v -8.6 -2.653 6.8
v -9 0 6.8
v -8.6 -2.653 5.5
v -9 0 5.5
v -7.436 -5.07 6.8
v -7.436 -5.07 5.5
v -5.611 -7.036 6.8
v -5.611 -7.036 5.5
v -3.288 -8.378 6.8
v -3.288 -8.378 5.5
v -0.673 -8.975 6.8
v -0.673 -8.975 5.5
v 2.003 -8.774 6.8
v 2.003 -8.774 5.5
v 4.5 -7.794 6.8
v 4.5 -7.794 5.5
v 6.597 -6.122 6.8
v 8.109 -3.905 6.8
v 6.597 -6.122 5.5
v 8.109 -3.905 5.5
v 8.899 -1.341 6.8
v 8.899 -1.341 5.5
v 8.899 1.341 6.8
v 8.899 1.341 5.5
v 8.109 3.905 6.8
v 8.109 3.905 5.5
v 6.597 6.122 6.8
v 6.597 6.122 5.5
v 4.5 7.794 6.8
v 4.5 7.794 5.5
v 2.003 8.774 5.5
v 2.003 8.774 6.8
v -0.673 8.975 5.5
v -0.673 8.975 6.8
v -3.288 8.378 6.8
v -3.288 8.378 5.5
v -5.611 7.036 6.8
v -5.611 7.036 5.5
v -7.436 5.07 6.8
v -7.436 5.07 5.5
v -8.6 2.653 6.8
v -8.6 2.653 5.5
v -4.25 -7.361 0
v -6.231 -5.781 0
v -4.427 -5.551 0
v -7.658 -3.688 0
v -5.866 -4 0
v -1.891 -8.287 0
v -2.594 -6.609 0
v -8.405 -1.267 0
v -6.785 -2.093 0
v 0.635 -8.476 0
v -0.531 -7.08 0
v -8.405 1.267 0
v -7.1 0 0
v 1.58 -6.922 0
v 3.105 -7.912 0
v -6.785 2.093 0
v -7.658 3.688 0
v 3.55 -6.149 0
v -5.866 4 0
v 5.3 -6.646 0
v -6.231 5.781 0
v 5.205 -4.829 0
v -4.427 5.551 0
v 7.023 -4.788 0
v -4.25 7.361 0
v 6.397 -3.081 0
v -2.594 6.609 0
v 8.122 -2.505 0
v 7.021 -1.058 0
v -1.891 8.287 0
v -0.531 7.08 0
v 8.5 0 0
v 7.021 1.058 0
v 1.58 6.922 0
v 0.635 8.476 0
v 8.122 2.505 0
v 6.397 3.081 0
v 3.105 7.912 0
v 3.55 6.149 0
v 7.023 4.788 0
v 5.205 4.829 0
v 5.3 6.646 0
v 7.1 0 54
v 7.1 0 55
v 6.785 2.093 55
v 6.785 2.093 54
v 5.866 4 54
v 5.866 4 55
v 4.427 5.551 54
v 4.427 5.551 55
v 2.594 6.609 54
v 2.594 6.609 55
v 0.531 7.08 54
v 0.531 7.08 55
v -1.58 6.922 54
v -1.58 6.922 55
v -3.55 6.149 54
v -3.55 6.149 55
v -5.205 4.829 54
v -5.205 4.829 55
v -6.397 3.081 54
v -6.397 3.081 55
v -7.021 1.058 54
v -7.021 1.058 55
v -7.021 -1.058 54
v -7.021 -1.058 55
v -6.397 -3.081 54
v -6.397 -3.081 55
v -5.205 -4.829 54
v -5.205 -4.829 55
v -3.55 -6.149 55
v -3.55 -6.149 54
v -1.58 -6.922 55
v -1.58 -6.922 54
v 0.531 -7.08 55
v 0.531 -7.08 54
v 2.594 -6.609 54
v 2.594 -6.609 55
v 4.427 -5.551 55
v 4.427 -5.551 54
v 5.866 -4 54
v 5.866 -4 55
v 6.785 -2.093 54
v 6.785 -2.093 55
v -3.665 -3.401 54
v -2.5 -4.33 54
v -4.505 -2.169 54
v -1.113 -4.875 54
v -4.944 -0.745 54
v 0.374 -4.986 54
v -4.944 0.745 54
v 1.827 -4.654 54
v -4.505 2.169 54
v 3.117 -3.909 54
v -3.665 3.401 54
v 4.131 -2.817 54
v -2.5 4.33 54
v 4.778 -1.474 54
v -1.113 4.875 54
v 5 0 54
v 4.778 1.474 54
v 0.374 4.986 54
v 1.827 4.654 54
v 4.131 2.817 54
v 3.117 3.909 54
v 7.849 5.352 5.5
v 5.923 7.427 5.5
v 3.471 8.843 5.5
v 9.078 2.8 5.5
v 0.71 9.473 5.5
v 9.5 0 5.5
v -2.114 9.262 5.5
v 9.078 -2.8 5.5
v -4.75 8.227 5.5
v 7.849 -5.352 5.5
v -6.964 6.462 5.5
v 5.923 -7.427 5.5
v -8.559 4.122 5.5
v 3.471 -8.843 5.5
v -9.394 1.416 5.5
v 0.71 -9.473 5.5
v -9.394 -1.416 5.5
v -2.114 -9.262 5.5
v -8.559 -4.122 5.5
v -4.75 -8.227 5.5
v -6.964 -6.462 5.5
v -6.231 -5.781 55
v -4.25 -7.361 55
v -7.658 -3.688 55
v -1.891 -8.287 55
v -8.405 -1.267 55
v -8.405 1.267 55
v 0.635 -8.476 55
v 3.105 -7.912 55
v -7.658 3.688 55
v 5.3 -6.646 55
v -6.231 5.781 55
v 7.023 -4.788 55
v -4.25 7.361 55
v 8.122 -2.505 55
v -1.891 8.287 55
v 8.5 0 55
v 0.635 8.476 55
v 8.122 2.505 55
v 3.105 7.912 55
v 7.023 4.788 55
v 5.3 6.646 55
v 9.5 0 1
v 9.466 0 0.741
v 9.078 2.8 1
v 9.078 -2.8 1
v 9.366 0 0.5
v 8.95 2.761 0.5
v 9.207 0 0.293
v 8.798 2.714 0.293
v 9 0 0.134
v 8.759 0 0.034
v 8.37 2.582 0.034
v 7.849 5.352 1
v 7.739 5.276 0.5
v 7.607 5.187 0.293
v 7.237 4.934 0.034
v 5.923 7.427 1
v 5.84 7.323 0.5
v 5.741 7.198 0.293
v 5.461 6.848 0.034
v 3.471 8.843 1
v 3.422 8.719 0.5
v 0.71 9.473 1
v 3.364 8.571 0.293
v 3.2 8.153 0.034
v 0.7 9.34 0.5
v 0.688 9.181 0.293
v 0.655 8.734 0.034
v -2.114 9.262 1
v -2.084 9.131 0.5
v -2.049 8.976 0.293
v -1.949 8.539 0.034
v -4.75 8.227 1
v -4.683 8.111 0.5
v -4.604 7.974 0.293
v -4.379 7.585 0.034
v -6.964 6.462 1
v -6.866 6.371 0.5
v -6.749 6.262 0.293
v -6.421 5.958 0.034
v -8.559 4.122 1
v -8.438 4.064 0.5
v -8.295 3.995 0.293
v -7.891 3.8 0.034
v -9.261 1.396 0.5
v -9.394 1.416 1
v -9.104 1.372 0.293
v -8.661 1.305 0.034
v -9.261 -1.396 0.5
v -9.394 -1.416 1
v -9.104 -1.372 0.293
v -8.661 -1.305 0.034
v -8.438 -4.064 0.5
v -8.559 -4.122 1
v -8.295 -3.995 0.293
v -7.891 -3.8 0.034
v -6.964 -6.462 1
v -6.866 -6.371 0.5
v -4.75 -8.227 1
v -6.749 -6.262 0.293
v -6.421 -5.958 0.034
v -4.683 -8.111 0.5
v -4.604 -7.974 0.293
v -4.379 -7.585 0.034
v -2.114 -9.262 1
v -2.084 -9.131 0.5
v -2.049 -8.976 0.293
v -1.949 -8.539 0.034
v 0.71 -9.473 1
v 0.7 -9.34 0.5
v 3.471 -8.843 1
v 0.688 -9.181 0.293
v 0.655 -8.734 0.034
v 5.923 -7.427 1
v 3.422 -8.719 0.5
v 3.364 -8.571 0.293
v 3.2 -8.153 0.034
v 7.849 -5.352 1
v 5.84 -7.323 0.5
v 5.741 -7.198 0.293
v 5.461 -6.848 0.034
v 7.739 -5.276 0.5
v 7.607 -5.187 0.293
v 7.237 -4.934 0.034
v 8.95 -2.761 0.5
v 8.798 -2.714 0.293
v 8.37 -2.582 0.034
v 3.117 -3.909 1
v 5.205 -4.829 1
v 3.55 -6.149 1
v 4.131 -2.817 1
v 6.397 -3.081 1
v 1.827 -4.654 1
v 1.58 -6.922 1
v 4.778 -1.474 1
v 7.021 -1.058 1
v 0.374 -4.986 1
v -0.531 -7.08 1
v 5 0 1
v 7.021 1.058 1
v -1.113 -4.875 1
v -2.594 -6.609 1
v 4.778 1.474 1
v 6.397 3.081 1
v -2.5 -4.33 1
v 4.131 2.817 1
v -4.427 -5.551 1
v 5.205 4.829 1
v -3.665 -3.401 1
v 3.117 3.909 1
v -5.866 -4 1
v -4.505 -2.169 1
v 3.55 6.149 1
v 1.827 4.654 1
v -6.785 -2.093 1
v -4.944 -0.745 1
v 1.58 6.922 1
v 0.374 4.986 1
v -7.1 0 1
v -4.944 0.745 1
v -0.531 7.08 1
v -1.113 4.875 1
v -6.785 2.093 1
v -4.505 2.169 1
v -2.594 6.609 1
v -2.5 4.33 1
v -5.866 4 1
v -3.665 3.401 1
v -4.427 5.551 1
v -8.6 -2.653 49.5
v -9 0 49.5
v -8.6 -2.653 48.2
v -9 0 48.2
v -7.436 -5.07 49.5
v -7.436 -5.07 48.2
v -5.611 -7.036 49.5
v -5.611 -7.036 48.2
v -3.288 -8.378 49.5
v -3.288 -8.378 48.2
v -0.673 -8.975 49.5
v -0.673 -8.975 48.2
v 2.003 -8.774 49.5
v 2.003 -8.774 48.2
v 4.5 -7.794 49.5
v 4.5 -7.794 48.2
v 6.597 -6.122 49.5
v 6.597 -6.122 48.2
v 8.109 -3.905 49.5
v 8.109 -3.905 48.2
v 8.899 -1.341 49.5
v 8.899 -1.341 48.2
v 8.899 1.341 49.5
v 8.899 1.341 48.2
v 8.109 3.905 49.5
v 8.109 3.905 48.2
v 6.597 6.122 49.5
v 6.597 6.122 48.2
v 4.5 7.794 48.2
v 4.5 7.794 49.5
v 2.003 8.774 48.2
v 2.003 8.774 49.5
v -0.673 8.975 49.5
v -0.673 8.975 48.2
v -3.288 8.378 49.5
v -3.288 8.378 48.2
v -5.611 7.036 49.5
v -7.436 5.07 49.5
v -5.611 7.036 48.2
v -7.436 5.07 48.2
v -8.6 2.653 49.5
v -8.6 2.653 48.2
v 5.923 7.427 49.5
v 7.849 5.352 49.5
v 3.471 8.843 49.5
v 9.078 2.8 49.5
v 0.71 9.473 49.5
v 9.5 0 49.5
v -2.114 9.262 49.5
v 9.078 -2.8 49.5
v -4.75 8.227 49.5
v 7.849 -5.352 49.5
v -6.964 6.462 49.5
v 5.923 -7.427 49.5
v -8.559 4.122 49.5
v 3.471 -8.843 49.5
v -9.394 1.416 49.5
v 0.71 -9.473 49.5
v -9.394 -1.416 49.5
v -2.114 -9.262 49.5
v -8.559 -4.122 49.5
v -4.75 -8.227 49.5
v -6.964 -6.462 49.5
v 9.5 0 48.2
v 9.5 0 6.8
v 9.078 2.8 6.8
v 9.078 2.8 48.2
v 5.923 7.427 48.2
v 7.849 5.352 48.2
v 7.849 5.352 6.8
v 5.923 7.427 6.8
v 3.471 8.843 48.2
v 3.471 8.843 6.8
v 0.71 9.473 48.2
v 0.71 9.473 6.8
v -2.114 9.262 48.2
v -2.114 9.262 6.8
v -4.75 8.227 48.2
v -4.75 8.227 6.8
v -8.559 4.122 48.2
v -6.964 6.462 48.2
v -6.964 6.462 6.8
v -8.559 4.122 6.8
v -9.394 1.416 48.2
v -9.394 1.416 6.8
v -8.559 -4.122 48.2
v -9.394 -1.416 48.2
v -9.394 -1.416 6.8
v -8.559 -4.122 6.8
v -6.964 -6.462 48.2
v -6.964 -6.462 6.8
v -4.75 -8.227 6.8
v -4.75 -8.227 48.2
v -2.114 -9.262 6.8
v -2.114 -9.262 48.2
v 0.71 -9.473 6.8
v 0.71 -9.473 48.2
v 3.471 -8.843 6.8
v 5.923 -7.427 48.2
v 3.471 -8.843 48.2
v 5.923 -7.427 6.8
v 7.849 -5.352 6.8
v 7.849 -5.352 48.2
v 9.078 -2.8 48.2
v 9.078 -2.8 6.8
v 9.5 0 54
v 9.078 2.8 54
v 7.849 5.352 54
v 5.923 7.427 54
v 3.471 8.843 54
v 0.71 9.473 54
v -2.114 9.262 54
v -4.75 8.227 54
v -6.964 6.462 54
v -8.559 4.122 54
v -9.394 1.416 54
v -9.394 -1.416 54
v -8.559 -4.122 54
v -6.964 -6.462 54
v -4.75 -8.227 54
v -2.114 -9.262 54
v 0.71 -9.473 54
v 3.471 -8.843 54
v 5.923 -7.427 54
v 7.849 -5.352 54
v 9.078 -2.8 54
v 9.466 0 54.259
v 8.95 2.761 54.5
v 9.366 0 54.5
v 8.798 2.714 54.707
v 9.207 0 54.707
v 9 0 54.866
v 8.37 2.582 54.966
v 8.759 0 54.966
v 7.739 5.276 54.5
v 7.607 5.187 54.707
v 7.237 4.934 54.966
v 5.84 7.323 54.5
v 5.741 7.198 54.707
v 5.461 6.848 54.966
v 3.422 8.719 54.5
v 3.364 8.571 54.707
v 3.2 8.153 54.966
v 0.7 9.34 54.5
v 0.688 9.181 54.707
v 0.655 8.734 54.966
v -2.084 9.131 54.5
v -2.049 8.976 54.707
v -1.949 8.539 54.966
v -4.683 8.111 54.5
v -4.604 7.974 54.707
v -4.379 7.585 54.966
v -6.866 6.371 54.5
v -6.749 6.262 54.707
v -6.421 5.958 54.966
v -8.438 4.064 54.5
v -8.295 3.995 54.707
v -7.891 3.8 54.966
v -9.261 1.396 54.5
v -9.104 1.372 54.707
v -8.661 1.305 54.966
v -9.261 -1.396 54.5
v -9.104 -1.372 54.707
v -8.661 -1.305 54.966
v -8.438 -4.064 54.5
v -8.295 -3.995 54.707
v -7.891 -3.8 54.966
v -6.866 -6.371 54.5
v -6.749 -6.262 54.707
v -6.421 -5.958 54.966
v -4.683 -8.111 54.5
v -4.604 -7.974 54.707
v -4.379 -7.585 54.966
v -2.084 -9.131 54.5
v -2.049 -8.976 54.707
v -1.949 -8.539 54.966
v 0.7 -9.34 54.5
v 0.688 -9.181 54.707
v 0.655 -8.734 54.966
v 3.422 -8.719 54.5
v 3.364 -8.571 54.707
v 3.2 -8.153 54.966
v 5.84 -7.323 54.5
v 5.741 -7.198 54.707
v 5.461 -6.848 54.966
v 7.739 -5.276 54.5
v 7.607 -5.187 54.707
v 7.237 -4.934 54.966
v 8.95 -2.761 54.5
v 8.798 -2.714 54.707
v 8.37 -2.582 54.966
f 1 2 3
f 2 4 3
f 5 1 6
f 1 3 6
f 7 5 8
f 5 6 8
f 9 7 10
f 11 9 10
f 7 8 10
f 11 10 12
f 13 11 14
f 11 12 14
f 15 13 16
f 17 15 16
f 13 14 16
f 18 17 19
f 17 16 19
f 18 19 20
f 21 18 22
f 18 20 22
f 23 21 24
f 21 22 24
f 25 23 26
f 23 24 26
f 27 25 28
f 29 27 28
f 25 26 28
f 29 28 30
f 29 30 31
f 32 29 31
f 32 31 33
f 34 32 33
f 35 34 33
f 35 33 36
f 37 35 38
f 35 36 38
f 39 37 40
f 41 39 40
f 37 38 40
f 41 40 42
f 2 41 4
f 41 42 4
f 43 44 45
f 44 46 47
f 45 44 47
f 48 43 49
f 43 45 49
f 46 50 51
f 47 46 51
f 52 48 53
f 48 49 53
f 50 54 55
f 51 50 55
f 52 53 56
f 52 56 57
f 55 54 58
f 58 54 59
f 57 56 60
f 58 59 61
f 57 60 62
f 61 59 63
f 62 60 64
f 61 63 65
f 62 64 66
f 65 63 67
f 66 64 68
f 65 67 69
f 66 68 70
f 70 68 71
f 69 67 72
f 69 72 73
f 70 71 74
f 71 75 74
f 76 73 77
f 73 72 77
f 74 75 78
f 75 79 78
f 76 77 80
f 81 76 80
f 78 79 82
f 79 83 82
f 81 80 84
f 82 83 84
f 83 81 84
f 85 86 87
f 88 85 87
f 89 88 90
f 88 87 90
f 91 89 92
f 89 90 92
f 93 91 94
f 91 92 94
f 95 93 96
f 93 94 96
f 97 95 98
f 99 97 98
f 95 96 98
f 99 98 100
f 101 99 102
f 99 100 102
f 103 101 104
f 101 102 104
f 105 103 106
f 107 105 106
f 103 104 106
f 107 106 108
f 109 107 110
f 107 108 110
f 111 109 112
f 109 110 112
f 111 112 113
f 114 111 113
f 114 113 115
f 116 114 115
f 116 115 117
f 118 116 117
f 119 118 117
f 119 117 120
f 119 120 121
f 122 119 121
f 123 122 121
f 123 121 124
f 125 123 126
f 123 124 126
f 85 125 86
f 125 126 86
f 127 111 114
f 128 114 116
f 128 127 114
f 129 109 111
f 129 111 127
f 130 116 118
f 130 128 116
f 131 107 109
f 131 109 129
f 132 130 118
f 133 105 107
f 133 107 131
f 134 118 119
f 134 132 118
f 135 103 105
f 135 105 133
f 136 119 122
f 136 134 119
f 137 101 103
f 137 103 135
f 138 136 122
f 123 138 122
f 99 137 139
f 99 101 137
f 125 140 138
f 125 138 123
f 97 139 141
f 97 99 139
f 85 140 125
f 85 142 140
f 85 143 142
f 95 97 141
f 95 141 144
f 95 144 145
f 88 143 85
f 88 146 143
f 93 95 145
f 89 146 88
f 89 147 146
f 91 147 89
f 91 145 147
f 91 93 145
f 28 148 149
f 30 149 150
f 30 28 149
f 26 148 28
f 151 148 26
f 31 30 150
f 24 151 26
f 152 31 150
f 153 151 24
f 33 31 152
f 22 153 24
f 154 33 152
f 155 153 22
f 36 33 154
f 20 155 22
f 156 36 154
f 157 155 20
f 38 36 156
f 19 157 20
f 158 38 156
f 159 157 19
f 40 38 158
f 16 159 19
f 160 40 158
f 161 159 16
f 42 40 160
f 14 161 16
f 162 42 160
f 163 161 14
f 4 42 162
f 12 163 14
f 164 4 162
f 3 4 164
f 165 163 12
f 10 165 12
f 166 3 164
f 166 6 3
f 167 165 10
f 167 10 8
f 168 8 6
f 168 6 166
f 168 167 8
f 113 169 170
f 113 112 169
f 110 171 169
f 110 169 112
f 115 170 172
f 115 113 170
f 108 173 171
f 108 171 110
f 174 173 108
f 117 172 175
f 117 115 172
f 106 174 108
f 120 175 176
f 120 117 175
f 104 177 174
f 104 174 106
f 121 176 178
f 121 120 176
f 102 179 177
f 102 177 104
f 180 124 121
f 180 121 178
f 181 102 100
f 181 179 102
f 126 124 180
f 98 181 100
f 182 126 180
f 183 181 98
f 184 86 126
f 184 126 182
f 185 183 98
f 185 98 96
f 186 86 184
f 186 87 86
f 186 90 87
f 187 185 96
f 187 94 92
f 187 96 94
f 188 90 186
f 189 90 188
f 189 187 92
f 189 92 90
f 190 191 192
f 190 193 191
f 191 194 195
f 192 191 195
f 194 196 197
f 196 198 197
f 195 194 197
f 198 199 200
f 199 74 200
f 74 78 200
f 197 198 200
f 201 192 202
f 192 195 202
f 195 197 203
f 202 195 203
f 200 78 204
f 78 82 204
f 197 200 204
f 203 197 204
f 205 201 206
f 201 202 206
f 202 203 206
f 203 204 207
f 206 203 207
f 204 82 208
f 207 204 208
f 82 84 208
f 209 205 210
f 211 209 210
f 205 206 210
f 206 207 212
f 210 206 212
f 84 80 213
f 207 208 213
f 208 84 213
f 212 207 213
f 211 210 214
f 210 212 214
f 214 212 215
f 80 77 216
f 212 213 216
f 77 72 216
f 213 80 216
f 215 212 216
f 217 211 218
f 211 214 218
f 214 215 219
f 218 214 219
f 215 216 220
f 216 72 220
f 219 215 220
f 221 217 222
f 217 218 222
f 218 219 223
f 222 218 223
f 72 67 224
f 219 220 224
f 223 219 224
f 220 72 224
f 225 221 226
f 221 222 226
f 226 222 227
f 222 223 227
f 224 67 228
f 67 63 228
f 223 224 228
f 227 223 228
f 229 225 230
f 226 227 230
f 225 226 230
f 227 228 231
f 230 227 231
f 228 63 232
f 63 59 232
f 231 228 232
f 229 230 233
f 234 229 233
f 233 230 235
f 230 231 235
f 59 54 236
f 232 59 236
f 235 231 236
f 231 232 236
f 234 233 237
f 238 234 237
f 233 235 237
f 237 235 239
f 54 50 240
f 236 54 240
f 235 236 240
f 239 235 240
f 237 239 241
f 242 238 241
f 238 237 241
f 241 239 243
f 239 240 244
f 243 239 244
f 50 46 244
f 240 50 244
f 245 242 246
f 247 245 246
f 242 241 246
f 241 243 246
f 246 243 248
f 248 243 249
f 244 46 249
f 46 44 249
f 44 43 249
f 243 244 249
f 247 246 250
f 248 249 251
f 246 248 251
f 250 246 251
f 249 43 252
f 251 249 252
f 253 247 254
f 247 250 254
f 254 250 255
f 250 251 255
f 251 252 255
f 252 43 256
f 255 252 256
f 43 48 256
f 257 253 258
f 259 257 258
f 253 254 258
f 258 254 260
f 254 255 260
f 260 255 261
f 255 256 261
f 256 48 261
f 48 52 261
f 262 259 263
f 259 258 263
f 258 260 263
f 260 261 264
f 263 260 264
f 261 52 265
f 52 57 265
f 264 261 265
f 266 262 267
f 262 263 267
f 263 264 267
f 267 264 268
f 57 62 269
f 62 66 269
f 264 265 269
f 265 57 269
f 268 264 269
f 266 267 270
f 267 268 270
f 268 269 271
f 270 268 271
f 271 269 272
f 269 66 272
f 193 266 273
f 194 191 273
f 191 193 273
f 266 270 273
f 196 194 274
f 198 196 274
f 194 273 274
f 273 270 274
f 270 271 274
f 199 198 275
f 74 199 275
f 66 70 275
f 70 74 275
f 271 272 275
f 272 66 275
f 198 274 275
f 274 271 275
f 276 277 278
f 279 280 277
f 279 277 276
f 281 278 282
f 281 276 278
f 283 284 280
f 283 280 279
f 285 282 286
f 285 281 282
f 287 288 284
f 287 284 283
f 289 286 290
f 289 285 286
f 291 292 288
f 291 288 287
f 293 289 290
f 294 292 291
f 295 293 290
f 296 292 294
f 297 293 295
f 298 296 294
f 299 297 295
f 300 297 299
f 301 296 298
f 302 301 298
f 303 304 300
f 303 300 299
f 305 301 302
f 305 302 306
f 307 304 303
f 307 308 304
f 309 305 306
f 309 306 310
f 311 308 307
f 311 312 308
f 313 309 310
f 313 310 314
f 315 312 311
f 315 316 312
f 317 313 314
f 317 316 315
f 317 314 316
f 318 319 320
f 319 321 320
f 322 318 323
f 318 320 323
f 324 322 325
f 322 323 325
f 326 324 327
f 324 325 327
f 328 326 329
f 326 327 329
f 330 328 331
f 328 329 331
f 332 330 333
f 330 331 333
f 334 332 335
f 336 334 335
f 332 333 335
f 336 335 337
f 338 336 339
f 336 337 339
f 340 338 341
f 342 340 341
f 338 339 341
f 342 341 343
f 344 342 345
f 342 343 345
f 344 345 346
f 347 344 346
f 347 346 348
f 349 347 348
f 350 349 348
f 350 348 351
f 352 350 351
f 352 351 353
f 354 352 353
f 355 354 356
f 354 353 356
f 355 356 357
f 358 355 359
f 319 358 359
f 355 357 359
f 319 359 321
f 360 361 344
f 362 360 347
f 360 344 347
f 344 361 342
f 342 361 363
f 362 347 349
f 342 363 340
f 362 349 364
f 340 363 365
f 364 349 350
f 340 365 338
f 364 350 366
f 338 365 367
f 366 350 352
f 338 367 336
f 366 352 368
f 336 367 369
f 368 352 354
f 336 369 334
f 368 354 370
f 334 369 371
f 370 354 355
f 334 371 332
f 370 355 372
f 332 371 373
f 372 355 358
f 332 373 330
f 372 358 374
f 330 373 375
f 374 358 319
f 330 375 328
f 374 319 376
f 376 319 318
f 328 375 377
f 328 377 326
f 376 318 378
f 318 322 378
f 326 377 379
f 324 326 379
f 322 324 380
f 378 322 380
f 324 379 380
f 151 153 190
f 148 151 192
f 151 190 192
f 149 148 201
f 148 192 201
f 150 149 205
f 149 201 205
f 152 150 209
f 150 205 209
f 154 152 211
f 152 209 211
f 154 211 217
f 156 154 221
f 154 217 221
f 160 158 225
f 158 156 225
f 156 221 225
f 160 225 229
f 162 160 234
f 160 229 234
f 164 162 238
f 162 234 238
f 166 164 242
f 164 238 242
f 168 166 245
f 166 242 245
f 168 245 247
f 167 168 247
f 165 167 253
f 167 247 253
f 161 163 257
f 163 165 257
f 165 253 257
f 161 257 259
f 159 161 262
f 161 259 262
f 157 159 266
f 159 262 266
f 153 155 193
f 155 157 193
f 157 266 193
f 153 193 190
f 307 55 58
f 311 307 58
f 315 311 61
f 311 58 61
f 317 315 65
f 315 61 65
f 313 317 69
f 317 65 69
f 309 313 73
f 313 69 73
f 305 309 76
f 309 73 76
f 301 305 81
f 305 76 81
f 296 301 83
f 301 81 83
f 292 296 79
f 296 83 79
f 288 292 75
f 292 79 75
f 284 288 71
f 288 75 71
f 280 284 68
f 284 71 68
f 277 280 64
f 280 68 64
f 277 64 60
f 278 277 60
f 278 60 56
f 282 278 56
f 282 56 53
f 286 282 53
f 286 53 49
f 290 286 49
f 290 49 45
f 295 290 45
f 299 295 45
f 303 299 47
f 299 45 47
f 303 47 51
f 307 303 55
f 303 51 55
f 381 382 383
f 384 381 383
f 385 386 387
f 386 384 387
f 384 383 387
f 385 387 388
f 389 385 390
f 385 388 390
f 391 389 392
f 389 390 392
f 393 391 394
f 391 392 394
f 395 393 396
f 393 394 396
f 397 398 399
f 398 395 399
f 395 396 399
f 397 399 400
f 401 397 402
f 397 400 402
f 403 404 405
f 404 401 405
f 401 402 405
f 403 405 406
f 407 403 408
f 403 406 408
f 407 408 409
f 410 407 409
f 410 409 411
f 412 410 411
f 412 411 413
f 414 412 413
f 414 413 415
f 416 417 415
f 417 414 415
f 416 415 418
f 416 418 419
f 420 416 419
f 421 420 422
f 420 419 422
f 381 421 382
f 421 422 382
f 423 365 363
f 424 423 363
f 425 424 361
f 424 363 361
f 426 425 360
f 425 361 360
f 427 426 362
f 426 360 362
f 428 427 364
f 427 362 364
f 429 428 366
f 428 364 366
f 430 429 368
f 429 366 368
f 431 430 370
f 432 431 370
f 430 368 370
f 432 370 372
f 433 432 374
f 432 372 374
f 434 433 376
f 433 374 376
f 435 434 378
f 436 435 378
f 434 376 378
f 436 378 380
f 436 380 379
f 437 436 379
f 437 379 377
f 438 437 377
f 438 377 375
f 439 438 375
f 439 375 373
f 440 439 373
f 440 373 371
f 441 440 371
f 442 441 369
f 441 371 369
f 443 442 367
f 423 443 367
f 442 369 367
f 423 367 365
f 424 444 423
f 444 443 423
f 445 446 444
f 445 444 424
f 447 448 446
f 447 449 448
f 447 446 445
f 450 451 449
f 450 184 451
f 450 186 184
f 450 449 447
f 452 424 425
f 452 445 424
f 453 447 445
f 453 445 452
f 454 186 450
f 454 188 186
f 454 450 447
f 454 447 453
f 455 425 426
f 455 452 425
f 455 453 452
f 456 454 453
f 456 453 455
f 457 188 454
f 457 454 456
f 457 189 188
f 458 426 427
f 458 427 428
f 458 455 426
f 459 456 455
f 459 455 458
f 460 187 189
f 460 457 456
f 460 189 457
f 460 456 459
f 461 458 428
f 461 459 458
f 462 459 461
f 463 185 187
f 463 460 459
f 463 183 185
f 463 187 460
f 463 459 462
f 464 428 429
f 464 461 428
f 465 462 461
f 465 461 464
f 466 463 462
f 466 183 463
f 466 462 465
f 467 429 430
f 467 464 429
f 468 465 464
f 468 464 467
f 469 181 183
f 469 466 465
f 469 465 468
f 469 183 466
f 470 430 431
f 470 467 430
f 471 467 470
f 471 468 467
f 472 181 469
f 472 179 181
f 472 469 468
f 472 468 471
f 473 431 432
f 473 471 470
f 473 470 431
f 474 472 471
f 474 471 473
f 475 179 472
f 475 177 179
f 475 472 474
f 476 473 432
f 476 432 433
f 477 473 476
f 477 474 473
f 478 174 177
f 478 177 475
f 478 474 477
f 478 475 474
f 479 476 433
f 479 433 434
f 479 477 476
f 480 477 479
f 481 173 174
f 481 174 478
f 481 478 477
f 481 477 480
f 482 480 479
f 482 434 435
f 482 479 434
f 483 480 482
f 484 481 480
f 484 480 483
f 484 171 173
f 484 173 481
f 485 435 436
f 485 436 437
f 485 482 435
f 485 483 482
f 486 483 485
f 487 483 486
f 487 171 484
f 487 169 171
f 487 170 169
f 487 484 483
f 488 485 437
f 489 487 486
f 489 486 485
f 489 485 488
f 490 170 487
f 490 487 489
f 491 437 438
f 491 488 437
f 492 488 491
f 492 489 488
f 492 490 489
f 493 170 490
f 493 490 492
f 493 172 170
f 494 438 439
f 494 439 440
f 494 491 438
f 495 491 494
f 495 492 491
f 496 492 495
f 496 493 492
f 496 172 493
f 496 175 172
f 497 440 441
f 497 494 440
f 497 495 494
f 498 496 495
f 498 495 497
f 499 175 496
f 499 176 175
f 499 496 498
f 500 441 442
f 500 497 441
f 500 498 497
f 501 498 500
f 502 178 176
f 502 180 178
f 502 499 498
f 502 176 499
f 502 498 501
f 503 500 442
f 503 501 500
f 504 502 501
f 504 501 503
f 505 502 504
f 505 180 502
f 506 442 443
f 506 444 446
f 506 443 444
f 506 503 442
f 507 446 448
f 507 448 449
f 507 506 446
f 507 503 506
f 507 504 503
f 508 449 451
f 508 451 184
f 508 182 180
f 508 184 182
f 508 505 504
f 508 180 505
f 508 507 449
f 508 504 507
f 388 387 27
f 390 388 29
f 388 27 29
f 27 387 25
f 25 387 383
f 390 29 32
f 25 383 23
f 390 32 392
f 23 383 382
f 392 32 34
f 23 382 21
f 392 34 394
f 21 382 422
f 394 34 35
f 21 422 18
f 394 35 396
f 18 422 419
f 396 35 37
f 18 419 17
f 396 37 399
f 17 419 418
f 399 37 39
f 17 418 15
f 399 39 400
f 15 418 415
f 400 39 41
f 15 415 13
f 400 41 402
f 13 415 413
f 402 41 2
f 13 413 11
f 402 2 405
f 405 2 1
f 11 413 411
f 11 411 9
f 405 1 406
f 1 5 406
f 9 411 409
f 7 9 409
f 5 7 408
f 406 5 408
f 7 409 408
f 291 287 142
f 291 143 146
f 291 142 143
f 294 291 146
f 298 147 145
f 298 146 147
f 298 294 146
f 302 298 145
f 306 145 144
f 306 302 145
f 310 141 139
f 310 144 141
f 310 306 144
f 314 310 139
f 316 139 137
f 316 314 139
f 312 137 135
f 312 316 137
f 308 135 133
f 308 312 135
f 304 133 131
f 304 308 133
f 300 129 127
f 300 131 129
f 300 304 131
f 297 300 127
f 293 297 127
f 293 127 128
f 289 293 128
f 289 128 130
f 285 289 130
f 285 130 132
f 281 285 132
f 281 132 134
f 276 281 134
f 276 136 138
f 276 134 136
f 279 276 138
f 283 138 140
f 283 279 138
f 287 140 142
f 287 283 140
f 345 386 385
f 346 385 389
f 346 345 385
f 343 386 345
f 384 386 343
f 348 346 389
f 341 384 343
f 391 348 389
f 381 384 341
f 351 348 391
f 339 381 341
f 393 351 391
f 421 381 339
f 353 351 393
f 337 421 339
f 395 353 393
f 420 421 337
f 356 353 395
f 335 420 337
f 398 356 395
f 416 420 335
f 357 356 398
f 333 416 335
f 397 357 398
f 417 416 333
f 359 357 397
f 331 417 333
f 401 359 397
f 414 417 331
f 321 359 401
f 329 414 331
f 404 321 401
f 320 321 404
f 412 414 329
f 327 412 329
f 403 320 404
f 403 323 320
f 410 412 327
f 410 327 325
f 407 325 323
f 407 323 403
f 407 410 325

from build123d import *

# Parameters (mm, degrees)
SKETCH1_R           = 9.5
SKETCH1_R_2         = 5
BOSS_EXTRUDE1_DEPTH = 55
SKETCH2_R           = 7.1
CUT_EXTRUDE1_DEPTH  = 1
SKETCH3_R           = 7.1
CUT_EXTRUDE2_DEPTH  = 1
SKETCH4_W           = 0.5
SKETCH4_H           = 1.3
FILLET1_R           = 1


with BuildPart() as part:
    # Sketch1 → Boss-Extrude1 (new body)
    with BuildSketch(Plane.XY):
        Circle(SKETCH1_R)
        Circle(SKETCH1_R_2, mode=Mode.SUBTRACT)
    extrude(amount=BOSS_EXTRUDE1_DEPTH)

    # Sketch2 → Cut-Extrude1 (cut)
    with BuildSketch(Plane.XY.offset(55)):
        Circle(SKETCH2_R)
    extrude(amount=-CUT_EXTRUDE1_DEPTH, mode=Mode.SUBTRACT)

    # Sketch3 → Cut-Extrude2 (cut)
    with BuildSketch(Plane(origin=(0, 0, 0), x_dir=(-1, 0, 0), z_dir=(0, 0, -1))):
        Circle(SKETCH3_R)
    extrude(amount=-CUT_EXTRUDE2_DEPTH, mode=Mode.SUBTRACT)

    # Sketch4 → Cut-Revolve1 (revolve, cut)
    with BuildSketch(Plane(origin=(0, 0, 0), x_dir=(1, 0, 0), z_dir=(0, 1, 0))):
        with Locations((-9.25, -48.85)):
            Rectangle(SKETCH4_W, SKETCH4_H)
        with Locations((-9.25, -6.15)):
            Rectangle(SKETCH4_W, SKETCH4_H)
    revolve(axis=Axis((0, 0, 0), (0, 0, 1)), mode=Mode.SUBTRACT)

    # Fillet1
    fillet1_edges = [part.edges().sort_by_distance(p)[0] for p in [
        (-9.5, 0, 0),
        (-9.5, 0, 55),
    ]]
    fillet(fillet1_edges, radius=FILLET1_R)


solid = part.part
